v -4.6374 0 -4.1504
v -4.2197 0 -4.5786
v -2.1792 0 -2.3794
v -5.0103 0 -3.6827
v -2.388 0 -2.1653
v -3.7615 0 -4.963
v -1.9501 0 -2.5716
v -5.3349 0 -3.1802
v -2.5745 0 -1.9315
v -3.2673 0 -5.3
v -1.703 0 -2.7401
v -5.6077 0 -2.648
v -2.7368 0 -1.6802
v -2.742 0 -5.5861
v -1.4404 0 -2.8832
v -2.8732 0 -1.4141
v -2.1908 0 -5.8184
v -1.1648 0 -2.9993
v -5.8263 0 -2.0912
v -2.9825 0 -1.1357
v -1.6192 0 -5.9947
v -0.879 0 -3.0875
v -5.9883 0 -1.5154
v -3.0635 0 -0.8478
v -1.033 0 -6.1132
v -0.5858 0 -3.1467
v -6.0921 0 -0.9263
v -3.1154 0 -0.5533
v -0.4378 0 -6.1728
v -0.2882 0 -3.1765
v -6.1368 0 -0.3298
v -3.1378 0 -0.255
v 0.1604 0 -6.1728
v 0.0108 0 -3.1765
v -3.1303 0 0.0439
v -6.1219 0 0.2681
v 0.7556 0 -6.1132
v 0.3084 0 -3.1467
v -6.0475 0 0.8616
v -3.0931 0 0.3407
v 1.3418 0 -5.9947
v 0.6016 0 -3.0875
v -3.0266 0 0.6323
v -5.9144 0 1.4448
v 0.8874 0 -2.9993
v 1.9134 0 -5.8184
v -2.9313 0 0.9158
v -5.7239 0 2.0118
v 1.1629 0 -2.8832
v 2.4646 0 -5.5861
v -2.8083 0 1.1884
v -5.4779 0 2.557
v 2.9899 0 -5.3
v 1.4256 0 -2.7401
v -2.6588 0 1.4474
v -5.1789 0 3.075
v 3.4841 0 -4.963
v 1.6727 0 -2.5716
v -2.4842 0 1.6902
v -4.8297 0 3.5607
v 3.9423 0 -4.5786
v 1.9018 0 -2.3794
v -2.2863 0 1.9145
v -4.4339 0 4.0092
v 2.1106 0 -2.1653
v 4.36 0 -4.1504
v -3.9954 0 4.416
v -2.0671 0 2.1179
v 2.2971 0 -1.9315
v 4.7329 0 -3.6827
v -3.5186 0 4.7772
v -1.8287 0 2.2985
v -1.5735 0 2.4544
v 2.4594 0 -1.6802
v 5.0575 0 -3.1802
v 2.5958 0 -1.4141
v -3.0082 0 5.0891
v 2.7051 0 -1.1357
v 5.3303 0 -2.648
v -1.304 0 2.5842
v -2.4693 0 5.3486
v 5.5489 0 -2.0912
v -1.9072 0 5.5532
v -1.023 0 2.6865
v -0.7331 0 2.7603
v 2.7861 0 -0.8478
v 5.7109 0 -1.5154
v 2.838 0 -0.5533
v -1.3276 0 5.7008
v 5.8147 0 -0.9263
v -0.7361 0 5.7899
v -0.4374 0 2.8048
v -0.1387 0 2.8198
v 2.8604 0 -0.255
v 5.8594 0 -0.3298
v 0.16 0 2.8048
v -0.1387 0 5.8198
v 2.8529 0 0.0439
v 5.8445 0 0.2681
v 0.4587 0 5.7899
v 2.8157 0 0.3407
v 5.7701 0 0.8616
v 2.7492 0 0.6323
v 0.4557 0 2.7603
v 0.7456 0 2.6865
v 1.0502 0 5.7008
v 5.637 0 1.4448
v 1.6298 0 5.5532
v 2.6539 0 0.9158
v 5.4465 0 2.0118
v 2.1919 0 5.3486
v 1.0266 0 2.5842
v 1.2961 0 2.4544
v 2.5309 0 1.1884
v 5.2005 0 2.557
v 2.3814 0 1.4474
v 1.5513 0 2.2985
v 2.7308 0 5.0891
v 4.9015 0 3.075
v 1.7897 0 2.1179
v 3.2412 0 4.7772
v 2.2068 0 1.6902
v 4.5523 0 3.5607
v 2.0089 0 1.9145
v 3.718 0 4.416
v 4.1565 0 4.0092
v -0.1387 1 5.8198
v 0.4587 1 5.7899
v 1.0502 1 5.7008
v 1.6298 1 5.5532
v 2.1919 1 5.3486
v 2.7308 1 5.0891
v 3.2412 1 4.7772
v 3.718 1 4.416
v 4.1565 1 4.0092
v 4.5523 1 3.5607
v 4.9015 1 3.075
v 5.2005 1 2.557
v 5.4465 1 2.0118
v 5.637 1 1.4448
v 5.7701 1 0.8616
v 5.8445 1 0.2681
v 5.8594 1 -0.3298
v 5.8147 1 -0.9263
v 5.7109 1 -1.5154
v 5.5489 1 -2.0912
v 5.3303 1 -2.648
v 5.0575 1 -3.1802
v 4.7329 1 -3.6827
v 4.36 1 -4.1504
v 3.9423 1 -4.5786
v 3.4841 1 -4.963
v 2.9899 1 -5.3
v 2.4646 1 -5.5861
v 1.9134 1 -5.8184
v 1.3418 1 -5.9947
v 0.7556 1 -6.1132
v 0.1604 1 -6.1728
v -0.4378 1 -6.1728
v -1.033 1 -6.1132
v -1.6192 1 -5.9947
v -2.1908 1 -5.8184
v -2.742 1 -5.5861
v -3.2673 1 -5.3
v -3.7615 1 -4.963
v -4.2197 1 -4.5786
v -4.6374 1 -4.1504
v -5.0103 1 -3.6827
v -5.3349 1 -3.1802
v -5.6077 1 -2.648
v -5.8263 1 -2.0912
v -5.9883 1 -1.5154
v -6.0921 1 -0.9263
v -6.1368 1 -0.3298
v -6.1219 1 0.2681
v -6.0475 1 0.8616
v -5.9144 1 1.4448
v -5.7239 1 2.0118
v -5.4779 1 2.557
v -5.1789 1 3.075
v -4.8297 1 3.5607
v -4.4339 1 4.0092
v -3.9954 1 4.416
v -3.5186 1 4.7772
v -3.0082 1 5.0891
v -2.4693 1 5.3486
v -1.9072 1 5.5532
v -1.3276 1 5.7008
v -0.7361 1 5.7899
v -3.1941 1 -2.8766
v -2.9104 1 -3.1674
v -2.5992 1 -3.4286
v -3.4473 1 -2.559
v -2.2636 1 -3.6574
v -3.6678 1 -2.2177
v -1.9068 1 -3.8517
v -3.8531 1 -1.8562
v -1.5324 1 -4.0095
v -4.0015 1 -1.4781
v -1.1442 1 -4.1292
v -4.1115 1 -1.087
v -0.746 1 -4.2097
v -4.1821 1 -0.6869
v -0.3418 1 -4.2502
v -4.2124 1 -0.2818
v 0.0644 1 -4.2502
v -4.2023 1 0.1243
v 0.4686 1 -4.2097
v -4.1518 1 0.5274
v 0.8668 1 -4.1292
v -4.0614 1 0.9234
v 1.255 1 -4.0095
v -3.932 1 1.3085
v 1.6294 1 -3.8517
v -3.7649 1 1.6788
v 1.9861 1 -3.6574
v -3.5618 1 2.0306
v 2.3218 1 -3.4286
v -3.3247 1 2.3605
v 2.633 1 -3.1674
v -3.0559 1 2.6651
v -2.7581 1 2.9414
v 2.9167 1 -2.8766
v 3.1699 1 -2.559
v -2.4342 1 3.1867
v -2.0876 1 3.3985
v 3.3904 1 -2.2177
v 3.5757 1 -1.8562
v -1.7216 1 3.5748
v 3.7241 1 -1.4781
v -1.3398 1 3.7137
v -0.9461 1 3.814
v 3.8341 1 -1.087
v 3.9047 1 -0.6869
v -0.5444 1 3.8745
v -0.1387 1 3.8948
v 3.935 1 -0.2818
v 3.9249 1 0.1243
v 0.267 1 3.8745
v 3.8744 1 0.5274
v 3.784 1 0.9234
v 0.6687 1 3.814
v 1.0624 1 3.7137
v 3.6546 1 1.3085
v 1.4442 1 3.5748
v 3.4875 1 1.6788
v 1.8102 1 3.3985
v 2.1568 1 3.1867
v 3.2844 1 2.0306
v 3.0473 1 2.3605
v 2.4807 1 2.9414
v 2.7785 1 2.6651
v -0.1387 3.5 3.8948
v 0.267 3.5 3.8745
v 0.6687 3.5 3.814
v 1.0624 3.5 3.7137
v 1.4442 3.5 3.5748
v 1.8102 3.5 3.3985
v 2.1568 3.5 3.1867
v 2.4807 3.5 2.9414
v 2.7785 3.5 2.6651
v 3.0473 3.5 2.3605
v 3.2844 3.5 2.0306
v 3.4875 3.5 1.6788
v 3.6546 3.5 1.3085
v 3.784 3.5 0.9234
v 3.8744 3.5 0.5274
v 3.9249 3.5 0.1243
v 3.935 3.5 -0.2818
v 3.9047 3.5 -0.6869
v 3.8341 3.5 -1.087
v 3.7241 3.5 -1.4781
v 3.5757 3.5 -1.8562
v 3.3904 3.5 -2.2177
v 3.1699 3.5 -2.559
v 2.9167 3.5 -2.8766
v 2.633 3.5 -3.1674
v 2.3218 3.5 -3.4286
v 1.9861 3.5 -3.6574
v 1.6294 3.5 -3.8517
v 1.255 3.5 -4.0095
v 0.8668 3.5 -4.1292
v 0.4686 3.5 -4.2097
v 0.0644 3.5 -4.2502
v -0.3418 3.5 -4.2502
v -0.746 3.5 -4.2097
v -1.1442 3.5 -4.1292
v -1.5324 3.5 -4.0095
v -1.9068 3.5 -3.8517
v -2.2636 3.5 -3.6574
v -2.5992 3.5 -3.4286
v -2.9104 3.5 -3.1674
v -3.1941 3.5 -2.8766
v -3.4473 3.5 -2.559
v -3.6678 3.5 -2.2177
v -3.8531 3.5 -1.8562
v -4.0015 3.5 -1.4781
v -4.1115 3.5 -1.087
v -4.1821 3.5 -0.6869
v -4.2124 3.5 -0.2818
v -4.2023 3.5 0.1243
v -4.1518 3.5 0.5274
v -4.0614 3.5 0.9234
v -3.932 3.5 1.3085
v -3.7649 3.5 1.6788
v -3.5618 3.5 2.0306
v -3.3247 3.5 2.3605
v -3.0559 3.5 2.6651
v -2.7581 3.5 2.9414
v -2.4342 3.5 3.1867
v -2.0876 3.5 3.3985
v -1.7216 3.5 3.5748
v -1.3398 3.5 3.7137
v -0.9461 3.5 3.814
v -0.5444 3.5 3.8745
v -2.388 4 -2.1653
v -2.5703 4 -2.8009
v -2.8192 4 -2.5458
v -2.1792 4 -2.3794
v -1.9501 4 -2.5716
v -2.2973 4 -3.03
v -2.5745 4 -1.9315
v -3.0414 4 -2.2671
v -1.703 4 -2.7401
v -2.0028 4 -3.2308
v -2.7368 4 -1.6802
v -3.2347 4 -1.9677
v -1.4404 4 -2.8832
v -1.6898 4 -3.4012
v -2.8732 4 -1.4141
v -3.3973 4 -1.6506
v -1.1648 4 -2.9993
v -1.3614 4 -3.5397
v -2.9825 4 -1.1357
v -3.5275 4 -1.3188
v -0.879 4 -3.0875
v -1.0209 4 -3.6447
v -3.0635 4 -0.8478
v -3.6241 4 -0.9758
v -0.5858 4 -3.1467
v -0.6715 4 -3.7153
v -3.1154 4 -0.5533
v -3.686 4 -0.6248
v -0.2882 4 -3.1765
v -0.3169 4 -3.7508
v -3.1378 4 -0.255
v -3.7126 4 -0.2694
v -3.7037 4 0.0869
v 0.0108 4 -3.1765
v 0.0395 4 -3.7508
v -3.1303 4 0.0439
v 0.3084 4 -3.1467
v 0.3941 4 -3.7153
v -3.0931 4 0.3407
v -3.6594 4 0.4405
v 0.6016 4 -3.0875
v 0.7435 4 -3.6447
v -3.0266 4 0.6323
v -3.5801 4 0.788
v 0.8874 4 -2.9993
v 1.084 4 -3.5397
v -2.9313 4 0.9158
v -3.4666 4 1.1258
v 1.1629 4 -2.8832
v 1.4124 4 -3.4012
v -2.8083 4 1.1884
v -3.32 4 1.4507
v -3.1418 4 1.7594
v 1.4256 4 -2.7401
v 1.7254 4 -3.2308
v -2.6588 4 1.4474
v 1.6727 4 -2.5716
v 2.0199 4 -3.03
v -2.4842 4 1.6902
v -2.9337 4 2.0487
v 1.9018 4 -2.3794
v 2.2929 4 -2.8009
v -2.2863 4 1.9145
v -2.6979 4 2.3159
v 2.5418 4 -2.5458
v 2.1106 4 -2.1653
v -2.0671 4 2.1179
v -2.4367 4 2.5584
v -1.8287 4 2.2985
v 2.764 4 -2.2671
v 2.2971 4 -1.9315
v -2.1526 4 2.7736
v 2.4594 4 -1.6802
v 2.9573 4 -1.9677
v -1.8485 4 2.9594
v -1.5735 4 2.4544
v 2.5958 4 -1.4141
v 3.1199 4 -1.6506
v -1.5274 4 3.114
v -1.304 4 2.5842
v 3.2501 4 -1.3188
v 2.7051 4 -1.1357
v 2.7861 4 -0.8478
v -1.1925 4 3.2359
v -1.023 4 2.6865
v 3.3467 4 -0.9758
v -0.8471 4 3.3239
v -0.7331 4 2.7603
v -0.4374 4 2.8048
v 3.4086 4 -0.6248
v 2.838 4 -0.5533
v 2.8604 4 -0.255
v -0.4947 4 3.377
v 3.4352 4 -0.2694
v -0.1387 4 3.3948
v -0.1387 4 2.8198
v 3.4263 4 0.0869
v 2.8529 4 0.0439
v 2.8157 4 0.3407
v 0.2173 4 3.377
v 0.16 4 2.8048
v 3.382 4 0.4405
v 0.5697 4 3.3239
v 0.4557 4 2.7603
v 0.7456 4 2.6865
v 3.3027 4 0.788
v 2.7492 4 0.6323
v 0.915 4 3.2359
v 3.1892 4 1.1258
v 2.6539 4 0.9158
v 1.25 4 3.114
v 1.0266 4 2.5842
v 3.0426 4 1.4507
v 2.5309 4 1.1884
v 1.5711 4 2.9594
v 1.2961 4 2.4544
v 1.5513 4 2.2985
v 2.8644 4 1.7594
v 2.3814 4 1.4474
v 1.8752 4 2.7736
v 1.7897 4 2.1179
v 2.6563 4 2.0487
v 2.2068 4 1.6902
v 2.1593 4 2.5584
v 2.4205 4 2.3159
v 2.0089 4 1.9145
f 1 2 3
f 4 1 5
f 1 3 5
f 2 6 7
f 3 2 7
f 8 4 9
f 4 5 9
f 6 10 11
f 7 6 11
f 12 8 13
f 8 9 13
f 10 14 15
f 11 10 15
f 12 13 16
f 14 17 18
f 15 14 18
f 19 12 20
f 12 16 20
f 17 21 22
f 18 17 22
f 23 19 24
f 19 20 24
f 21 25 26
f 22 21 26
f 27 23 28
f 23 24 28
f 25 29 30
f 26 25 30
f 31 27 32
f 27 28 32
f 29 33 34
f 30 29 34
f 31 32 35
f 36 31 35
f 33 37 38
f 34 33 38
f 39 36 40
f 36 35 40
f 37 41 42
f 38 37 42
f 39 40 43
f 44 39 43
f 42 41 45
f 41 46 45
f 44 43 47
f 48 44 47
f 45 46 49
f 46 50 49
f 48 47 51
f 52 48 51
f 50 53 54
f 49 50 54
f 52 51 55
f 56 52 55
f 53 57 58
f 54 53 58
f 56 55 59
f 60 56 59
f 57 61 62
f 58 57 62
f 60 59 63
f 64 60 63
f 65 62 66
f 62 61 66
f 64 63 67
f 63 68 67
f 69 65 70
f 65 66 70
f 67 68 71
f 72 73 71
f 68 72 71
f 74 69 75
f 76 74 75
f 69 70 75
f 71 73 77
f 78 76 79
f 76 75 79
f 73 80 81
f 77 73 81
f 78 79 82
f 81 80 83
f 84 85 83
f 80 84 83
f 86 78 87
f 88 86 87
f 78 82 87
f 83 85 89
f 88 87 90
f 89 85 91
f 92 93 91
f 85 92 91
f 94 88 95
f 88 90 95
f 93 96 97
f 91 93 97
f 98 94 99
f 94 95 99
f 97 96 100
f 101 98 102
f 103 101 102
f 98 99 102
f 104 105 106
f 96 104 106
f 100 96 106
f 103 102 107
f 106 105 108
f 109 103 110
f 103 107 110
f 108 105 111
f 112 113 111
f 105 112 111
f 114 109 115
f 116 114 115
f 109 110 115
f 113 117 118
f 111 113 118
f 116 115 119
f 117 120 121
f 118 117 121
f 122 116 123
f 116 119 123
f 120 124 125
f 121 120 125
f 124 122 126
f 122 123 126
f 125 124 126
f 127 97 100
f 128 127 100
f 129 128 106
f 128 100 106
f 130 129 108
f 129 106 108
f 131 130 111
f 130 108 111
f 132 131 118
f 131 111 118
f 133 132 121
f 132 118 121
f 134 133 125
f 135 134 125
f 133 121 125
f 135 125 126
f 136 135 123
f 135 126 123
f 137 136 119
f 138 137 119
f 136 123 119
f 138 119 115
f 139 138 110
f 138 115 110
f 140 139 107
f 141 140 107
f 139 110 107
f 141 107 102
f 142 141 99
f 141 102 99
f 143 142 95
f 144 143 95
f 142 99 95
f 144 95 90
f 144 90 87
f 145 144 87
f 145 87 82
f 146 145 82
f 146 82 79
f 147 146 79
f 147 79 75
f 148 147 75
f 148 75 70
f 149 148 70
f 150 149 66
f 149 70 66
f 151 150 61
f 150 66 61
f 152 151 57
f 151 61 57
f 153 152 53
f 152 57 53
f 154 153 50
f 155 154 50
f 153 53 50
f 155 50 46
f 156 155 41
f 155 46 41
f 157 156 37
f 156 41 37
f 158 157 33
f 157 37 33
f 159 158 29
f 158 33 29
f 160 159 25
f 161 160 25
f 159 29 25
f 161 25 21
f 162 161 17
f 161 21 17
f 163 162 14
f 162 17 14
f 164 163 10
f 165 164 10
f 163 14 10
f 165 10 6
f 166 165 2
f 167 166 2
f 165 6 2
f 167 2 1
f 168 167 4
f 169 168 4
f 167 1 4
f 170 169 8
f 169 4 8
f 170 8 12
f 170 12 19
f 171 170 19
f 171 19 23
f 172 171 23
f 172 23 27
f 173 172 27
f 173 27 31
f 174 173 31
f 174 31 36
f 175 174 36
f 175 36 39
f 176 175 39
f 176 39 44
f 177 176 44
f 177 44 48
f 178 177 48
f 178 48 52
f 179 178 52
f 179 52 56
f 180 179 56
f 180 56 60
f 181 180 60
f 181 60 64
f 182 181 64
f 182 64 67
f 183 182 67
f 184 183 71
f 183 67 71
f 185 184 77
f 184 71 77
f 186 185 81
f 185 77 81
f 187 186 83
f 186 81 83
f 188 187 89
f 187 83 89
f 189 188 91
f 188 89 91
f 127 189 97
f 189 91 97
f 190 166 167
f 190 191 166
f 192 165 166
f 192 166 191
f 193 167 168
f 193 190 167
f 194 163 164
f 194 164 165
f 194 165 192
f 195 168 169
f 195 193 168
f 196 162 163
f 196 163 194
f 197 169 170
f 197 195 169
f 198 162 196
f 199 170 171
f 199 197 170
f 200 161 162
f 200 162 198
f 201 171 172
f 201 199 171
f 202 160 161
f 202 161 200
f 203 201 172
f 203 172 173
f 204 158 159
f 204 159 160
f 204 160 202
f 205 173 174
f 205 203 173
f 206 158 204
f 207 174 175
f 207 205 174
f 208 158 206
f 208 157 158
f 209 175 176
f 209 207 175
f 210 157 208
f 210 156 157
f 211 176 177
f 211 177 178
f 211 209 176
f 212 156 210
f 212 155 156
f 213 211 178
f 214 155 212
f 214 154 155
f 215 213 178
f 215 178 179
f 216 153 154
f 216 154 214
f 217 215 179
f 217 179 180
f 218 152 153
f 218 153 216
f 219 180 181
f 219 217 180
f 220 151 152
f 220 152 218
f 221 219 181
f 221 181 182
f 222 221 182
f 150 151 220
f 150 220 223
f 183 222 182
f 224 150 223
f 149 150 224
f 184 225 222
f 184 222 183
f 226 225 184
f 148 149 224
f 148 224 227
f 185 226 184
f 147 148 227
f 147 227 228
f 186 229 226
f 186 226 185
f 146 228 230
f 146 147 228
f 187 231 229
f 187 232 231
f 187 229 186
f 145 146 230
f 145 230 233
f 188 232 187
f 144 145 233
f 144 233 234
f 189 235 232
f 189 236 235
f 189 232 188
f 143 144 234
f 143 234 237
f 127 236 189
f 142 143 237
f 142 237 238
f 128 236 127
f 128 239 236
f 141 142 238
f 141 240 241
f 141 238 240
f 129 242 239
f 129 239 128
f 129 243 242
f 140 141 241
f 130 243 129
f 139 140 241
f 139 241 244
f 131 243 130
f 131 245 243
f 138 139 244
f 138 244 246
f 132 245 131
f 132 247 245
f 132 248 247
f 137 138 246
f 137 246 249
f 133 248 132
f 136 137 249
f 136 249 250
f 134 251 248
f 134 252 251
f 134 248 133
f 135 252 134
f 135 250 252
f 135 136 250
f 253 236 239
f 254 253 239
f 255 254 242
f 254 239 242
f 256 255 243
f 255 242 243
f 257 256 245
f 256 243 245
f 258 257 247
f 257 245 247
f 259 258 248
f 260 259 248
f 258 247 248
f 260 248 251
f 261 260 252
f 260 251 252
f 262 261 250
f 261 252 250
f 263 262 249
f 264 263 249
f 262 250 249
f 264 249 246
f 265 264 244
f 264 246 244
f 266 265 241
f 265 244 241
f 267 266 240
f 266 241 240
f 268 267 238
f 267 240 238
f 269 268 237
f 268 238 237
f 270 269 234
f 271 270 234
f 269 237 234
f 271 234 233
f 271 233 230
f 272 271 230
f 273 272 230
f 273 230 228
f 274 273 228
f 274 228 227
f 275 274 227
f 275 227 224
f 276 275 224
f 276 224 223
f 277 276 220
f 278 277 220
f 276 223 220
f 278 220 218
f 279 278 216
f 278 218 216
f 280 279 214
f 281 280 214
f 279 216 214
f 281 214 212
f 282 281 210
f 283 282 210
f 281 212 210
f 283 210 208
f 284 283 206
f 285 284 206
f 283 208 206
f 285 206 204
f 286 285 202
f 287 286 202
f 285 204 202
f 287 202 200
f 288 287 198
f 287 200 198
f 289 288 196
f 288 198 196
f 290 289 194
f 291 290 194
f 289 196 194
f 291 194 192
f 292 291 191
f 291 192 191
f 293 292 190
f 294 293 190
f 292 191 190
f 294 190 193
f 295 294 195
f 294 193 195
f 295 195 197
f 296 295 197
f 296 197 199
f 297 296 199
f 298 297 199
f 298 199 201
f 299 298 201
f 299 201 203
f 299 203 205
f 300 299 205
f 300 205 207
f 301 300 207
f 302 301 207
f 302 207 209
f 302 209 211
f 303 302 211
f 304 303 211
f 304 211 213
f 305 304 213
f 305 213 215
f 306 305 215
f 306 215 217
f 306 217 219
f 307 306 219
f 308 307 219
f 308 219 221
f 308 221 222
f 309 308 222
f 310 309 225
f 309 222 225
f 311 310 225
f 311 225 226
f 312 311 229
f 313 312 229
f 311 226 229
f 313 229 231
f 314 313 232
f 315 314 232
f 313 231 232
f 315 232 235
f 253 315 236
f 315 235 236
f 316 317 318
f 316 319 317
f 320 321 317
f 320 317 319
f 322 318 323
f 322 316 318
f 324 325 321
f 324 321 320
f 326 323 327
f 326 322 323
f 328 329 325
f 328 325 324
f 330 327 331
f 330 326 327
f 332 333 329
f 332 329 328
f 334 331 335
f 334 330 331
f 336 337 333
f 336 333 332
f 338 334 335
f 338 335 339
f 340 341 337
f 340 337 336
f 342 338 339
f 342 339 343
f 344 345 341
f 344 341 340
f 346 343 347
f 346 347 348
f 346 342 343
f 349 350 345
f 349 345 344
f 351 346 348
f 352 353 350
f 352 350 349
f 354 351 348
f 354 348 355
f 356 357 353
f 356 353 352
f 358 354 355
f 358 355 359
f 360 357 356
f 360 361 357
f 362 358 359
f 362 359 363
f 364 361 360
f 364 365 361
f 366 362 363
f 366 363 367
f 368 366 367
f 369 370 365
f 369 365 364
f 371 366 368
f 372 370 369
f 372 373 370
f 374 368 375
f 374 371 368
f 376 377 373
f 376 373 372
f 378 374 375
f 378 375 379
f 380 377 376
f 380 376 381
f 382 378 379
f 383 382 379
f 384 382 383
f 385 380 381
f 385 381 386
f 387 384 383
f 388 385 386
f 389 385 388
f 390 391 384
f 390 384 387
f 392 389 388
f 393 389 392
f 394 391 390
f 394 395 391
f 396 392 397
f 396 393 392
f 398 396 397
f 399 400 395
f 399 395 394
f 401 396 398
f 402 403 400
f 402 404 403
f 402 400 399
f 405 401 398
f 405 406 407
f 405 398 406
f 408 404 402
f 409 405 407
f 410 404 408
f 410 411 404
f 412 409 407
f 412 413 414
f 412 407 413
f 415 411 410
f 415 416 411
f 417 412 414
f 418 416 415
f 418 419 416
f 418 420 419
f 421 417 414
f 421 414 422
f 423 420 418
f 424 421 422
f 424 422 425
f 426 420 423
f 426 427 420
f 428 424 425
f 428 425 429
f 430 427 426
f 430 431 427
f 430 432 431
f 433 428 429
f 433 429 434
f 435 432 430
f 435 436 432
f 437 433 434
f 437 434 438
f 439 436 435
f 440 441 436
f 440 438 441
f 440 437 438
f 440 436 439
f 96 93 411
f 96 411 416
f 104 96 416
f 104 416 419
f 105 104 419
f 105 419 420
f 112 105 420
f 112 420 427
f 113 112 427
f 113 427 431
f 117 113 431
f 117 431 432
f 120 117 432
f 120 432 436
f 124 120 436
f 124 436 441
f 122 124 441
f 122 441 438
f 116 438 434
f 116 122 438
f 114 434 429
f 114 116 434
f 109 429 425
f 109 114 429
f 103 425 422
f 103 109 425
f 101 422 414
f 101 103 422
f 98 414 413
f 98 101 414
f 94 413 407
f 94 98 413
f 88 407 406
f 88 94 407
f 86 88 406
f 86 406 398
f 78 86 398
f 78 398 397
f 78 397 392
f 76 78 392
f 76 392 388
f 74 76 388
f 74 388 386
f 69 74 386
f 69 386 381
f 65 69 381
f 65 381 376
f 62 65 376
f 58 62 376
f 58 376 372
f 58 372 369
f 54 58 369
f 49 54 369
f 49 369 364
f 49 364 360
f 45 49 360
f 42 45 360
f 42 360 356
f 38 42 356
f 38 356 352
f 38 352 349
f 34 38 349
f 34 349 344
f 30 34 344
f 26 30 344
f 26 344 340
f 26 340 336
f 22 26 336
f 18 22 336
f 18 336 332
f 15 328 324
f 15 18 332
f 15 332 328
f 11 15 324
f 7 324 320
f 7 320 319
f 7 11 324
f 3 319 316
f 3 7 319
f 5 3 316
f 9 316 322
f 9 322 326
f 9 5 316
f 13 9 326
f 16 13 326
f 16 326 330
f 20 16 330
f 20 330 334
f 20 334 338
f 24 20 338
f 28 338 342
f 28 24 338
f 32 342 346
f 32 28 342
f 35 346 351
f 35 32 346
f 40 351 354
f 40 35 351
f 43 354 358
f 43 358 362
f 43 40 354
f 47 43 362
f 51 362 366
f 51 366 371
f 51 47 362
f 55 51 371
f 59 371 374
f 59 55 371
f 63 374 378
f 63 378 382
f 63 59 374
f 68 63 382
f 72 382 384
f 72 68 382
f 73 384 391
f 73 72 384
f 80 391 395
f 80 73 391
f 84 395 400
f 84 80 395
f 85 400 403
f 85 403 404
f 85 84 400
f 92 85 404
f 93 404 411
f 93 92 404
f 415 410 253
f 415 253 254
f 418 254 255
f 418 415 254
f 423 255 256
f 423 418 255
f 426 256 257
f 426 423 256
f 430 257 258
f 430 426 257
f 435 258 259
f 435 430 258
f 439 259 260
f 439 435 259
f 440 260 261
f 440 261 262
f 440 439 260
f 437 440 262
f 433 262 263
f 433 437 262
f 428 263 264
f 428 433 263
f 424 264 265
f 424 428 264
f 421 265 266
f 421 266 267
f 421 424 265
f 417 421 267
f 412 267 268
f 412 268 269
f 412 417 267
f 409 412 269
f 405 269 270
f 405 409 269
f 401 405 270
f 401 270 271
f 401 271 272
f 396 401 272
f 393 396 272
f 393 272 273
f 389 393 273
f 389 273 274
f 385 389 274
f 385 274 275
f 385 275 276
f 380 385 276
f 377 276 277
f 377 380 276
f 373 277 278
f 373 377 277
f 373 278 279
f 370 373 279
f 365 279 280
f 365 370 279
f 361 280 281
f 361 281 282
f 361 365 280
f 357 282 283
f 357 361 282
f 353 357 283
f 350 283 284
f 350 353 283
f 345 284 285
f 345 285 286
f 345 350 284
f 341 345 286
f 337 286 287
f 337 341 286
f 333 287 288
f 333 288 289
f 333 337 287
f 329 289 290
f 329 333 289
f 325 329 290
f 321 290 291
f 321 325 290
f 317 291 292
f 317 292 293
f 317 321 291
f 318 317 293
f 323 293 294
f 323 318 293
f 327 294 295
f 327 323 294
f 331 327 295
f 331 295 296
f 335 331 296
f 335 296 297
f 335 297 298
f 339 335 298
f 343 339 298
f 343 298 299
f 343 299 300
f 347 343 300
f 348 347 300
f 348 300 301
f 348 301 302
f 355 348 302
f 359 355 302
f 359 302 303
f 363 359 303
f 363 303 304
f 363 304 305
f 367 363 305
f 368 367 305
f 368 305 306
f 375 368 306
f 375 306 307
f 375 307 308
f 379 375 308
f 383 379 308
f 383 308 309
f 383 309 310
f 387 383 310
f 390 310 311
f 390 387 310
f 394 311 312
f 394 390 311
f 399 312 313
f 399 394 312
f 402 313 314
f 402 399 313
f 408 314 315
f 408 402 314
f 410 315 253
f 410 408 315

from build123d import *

# Parameters (mm, degrees)
SKETCH_1_R          = 6
EXTRUDE_1_DEPTH     = 1
SKETCH_2_R          = 4.075
SKETCH_2_R_2        = 3
EXTRUDE_2_DEPTH     = 3
CUT_EXTRUDE_START   = -3
SKETCH_3_R          = 3
CUT_EXTRUDE_1_DEPTH = 3
CHAMFER_1_SIZE      = 0.5


with BuildPart() as part:
    # 草图1 → 凸台-拉伸1 (new body)
    with BuildSketch(Plane(origin=(0, 0, 0), x_dir=(1, 0, 0), z_dir=(0, 1, 0))):
        with Locations(Location((-0.138701754, 0.180249091, 0), (0, 0, 270))):
            Circle(SKETCH_1_R)
    extrude(amount=EXTRUDE_1_DEPTH)

    # 草图2 → 凸台-拉伸2 (add)
    with BuildSketch(Plane(origin=(0, 1, 0), x_dir=(1, 0, 0), z_dir=(0, 1, 0))):
        with Locations(Location((-0.138701754, 0.180249091, 0), (0, 0, 270))):
            Circle(SKETCH_2_R)
        with Locations(Location((-0.138701754, 0.180249091, 0), (0, 0, 270))):
            Circle(SKETCH_2_R_2, mode=Mode.SUBTRACT)
    extrude(amount=EXTRUDE_2_DEPTH)

    # 草图3 → 切除-拉伸1 (cut)
    with BuildSketch(Plane(origin=(0, 1, 0), x_dir=(1, 0, 0), z_dir=(0, 1, 0)).offset(CUT_EXTRUDE_START)):
        with Locations(Location((-0.138701754, 0.180249091, 0), (0, 0, 270))):
            Circle(SKETCH_3_R)
    extrude(amount=CUT_EXTRUDE_1_DEPTH, mode=Mode.SUBTRACT)

    # 倒角1
    chamfer_1_edges = [part.edges().sort_by_distance(p)[0] for p in [
        (-0.138701754, 4, -4.255249091),
    ]]
    chamfer(chamfer_1_edges, length=CHAMFER_1_SIZE)


solid = part.part
